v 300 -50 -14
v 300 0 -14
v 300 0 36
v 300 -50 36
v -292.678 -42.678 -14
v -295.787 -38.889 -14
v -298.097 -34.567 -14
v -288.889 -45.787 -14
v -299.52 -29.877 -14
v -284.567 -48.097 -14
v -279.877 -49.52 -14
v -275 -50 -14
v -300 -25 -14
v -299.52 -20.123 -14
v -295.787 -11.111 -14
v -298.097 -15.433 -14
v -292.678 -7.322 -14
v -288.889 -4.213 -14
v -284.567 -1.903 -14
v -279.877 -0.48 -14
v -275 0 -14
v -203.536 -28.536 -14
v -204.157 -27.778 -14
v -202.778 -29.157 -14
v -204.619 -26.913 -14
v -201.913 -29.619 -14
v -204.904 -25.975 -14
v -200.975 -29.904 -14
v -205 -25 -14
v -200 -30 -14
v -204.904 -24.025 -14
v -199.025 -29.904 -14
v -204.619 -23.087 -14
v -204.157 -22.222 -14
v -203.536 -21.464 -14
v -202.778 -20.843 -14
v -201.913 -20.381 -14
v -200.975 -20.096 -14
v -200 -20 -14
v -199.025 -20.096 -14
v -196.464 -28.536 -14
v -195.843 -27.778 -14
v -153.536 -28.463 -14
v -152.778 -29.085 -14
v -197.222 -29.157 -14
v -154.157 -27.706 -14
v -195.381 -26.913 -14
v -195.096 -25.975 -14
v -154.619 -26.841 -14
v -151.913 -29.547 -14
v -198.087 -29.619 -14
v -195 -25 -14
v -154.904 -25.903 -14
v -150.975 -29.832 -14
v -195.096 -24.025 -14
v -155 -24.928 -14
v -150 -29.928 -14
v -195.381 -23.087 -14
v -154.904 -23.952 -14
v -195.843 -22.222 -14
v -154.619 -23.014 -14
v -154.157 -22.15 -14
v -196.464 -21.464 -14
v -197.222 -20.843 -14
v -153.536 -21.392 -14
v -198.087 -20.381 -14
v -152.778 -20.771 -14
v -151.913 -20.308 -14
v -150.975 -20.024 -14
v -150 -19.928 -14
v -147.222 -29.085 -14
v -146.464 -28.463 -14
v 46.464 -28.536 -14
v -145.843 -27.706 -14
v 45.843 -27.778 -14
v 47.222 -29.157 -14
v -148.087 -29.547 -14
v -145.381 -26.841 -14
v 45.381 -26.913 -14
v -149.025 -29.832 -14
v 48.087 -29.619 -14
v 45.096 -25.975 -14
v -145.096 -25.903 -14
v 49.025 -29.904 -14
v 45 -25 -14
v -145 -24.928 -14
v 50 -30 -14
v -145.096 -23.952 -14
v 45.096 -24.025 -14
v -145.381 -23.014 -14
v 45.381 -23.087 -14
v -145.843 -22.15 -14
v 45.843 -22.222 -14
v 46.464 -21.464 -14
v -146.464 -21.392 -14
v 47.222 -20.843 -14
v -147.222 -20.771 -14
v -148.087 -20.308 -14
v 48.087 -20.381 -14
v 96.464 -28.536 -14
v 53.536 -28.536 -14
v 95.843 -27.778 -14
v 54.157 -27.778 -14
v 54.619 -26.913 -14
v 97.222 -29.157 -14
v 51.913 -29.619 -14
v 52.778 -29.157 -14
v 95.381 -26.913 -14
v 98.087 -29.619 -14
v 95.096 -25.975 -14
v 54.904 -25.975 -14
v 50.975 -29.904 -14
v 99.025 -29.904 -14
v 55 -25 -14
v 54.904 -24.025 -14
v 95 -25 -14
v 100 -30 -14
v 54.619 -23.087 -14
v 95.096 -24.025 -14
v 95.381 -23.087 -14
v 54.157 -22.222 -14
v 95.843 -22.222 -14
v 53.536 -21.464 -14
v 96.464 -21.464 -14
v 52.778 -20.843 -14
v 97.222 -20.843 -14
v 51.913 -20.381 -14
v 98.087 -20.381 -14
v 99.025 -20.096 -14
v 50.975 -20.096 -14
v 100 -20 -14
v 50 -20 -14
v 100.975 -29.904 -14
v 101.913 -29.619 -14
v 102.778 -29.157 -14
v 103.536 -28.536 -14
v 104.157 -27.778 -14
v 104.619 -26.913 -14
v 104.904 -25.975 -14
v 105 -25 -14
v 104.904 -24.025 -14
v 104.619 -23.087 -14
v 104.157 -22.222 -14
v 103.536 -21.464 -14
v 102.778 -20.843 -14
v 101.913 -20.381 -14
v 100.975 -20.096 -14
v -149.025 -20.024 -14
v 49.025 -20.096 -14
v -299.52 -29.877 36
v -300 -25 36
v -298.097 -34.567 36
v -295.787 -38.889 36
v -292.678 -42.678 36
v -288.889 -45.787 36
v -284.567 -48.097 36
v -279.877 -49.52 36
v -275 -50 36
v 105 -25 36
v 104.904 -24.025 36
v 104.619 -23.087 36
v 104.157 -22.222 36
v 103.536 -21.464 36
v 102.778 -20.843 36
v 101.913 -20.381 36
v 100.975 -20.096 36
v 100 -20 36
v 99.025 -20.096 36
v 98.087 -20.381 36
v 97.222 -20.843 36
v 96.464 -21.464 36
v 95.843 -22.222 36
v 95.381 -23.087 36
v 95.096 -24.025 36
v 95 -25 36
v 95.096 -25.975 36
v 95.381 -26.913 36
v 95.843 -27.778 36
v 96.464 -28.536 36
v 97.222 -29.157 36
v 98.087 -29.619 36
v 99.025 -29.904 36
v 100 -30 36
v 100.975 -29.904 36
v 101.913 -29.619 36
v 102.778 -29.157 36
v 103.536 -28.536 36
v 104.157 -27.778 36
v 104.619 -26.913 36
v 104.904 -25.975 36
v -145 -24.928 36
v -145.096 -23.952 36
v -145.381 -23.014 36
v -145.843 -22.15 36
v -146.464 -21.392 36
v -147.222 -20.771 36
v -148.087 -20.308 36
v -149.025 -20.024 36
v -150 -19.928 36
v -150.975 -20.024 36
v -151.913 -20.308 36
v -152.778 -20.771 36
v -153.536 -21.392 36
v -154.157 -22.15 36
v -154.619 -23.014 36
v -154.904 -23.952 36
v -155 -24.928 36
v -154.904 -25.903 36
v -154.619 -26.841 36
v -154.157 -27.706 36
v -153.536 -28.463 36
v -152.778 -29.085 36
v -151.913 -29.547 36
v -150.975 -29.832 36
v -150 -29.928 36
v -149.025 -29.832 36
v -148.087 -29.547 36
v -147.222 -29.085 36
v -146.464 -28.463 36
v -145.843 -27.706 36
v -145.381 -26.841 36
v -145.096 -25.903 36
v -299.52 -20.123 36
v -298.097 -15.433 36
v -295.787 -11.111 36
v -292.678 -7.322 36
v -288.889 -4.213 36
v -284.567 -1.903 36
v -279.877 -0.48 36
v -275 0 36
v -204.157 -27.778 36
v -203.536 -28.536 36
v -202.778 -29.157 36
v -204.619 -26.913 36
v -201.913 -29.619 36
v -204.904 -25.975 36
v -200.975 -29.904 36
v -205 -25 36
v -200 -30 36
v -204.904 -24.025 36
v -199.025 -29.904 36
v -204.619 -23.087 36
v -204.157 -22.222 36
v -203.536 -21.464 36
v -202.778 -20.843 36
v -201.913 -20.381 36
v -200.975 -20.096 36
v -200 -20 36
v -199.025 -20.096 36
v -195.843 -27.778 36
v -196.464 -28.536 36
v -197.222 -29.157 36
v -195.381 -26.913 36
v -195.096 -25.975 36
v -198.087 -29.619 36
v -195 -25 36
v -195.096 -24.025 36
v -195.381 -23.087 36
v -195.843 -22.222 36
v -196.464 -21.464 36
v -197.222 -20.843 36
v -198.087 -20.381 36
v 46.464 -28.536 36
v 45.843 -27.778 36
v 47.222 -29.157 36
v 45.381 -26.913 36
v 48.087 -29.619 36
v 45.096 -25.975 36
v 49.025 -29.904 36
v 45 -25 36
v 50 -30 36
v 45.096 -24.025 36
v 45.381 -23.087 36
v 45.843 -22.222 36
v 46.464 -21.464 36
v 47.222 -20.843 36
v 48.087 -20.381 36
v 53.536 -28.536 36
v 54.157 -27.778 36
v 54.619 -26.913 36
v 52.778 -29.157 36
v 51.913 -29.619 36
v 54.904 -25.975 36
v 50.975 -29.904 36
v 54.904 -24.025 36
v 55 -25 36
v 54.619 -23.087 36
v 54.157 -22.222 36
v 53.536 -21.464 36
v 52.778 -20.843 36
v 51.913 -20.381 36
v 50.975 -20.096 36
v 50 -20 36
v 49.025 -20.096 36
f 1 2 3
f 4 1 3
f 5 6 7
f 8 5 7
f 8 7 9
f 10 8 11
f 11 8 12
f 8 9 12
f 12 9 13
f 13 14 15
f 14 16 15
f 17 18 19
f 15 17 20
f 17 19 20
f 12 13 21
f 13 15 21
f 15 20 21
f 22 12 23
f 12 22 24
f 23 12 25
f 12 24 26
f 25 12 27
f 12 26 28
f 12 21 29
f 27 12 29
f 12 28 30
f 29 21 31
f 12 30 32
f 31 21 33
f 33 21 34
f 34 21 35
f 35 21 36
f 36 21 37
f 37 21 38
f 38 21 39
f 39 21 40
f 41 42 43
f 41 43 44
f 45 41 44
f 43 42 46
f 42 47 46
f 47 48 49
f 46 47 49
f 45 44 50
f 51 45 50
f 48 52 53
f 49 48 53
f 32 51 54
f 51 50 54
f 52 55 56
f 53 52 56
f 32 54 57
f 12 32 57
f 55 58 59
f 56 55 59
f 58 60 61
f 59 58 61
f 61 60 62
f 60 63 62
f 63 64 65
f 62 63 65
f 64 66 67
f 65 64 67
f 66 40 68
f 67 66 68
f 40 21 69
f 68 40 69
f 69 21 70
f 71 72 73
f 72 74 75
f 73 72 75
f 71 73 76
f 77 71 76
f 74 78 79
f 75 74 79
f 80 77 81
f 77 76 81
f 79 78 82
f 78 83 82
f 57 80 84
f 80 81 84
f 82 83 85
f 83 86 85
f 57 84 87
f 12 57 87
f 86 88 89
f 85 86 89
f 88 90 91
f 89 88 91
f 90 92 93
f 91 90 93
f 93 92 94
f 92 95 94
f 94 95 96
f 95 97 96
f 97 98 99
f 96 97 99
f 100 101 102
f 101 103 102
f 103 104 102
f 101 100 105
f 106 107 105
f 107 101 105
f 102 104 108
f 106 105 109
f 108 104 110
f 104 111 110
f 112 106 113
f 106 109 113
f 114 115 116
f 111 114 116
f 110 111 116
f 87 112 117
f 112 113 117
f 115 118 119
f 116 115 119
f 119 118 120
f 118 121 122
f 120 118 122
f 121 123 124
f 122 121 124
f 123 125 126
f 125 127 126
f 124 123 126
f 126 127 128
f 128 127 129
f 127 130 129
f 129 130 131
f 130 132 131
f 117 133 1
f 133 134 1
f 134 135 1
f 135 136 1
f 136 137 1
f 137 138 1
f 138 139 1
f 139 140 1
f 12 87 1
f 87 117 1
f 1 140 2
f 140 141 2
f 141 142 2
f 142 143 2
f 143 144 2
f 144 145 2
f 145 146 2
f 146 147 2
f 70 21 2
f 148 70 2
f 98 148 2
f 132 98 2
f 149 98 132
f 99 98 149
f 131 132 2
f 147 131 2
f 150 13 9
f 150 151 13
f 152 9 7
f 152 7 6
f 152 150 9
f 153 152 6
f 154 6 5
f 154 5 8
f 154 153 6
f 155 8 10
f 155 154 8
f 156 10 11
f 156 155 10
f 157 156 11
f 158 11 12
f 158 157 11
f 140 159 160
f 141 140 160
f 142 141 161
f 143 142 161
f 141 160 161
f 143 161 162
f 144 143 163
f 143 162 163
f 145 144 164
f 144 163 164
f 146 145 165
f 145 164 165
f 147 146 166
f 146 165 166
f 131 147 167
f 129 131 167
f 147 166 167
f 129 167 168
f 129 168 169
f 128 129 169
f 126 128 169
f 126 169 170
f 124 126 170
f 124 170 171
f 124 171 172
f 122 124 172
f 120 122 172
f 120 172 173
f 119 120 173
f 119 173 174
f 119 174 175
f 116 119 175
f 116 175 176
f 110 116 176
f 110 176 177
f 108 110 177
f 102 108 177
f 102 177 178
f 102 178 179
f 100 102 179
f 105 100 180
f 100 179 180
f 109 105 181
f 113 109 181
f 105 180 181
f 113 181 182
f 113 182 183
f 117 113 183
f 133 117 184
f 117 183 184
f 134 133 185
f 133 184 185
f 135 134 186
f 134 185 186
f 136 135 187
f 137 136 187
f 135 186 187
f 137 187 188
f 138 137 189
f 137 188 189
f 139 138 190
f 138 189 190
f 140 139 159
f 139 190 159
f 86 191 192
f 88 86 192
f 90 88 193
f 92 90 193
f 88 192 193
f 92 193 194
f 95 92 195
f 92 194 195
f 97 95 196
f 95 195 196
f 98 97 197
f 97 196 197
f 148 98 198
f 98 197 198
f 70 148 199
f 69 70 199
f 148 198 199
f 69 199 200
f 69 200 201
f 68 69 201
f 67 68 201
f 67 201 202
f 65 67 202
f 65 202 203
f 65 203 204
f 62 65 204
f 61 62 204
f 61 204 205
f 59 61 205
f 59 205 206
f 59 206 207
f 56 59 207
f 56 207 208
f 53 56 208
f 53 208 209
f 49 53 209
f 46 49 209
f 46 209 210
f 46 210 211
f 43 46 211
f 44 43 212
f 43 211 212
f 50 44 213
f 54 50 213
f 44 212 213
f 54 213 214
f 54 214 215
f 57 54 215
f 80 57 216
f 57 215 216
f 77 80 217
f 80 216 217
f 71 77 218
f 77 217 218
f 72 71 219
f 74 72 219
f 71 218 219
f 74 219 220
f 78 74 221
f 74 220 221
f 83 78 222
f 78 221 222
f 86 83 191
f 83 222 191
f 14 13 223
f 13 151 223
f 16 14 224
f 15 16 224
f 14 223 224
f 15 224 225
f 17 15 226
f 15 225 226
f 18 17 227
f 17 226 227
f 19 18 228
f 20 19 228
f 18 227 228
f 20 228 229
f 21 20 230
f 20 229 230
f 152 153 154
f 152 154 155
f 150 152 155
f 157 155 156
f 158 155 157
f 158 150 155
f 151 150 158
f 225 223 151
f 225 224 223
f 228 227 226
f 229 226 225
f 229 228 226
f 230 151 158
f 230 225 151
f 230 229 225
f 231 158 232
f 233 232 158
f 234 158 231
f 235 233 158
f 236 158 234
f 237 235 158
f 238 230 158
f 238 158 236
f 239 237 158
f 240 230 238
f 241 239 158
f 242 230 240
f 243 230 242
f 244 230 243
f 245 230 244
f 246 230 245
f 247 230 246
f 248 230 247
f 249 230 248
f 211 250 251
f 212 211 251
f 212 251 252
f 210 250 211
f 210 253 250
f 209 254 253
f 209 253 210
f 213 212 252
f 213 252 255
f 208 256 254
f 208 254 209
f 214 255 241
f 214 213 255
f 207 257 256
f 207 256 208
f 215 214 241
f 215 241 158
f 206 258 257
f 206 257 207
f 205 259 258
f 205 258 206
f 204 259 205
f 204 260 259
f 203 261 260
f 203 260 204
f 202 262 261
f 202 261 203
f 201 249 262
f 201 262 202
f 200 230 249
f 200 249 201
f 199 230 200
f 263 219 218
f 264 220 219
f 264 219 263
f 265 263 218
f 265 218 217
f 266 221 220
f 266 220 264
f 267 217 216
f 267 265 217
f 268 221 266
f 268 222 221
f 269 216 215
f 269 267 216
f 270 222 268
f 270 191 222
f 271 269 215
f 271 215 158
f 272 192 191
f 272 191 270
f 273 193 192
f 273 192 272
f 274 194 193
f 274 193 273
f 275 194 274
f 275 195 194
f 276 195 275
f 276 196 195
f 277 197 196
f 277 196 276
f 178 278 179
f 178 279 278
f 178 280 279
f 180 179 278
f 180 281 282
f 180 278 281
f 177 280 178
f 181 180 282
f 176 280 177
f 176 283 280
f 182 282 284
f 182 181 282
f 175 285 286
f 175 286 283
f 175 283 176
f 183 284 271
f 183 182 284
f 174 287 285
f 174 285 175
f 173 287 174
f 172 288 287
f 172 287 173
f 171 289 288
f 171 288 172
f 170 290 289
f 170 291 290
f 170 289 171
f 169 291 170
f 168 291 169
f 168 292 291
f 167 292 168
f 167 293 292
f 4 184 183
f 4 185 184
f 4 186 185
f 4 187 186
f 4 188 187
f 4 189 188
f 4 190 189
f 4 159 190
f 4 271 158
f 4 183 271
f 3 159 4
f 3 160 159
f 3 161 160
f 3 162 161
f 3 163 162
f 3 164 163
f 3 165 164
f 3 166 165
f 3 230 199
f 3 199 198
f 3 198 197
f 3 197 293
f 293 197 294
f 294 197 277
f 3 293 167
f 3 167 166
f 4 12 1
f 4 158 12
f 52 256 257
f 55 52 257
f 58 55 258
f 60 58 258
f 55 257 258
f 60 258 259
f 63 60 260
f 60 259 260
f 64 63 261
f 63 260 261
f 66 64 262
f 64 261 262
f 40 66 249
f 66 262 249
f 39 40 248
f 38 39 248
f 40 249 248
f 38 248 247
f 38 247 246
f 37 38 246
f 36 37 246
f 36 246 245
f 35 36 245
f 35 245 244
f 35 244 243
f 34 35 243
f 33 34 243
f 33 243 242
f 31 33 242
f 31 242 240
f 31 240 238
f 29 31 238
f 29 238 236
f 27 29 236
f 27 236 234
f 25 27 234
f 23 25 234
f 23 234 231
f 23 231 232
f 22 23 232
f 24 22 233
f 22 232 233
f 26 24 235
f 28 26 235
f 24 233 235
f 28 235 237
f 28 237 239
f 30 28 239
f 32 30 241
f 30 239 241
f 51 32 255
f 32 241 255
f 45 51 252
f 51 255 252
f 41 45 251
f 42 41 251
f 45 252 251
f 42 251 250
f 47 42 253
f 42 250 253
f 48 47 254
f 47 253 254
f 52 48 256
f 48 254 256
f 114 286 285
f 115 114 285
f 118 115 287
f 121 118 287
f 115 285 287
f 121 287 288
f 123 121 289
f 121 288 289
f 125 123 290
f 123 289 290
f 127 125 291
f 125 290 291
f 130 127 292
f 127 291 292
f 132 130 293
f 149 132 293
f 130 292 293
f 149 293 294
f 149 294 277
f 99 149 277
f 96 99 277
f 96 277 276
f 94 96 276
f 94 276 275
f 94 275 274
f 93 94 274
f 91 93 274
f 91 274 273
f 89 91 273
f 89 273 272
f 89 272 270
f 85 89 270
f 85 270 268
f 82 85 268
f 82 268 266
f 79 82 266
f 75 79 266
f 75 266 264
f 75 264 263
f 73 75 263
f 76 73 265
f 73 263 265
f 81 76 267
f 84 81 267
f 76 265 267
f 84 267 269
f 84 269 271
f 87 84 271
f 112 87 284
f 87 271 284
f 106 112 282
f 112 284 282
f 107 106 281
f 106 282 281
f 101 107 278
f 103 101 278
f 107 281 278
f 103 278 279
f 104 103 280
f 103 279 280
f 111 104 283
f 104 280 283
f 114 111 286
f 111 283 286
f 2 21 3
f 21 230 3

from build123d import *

# Parameters (mm, degrees)
F0_W     = 600
F0_H     = 50
F1_DEPTH = 50
F2_R     = 5
F3_DEPTH = 50.001
F4_R     = 24.99999


# Not quite as in the source:
# - a fillet or chamfer is up to 0.001 mm smaller than in the source, because OpenCascade refuses the exact size


with BuildPart() as f1:
    # F0 (on Front) → F1 (new body)
    with BuildSketch(Plane.XZ):
        with Locations((0, 10.9999733963)):
            Rectangle(F0_W, F0_H)
    extrude(amount=F1_DEPTH)

    # F2 (on face) → F3 (cut, through all)
    with BuildSketch(Plane.XY.offset(35.9999733963)):
        with Locations((50, -25)):
            Circle(F2_R)
        with Locations((-200, -25)):
            Circle(F2_R)
        with Locations((100, -25)):
            Circle(F2_R)
        with Locations((-150, -24.9278768897)):
            Circle(F2_R)
    extrude(amount=-F3_DEPTH, mode=Mode.SUBTRACT)

    # F4 (radius 25 in the source; OpenCascade refuses exactly that, so slightly less here)
    f4_edges = [f1.edges().sort_by_distance(p)[0] for p in [
        (-300, 0, 10.999973),
        (-300, -50, 10.999973),
    ]]
    fillet(f4_edges, radius=F4_R)


solid = f1.part
